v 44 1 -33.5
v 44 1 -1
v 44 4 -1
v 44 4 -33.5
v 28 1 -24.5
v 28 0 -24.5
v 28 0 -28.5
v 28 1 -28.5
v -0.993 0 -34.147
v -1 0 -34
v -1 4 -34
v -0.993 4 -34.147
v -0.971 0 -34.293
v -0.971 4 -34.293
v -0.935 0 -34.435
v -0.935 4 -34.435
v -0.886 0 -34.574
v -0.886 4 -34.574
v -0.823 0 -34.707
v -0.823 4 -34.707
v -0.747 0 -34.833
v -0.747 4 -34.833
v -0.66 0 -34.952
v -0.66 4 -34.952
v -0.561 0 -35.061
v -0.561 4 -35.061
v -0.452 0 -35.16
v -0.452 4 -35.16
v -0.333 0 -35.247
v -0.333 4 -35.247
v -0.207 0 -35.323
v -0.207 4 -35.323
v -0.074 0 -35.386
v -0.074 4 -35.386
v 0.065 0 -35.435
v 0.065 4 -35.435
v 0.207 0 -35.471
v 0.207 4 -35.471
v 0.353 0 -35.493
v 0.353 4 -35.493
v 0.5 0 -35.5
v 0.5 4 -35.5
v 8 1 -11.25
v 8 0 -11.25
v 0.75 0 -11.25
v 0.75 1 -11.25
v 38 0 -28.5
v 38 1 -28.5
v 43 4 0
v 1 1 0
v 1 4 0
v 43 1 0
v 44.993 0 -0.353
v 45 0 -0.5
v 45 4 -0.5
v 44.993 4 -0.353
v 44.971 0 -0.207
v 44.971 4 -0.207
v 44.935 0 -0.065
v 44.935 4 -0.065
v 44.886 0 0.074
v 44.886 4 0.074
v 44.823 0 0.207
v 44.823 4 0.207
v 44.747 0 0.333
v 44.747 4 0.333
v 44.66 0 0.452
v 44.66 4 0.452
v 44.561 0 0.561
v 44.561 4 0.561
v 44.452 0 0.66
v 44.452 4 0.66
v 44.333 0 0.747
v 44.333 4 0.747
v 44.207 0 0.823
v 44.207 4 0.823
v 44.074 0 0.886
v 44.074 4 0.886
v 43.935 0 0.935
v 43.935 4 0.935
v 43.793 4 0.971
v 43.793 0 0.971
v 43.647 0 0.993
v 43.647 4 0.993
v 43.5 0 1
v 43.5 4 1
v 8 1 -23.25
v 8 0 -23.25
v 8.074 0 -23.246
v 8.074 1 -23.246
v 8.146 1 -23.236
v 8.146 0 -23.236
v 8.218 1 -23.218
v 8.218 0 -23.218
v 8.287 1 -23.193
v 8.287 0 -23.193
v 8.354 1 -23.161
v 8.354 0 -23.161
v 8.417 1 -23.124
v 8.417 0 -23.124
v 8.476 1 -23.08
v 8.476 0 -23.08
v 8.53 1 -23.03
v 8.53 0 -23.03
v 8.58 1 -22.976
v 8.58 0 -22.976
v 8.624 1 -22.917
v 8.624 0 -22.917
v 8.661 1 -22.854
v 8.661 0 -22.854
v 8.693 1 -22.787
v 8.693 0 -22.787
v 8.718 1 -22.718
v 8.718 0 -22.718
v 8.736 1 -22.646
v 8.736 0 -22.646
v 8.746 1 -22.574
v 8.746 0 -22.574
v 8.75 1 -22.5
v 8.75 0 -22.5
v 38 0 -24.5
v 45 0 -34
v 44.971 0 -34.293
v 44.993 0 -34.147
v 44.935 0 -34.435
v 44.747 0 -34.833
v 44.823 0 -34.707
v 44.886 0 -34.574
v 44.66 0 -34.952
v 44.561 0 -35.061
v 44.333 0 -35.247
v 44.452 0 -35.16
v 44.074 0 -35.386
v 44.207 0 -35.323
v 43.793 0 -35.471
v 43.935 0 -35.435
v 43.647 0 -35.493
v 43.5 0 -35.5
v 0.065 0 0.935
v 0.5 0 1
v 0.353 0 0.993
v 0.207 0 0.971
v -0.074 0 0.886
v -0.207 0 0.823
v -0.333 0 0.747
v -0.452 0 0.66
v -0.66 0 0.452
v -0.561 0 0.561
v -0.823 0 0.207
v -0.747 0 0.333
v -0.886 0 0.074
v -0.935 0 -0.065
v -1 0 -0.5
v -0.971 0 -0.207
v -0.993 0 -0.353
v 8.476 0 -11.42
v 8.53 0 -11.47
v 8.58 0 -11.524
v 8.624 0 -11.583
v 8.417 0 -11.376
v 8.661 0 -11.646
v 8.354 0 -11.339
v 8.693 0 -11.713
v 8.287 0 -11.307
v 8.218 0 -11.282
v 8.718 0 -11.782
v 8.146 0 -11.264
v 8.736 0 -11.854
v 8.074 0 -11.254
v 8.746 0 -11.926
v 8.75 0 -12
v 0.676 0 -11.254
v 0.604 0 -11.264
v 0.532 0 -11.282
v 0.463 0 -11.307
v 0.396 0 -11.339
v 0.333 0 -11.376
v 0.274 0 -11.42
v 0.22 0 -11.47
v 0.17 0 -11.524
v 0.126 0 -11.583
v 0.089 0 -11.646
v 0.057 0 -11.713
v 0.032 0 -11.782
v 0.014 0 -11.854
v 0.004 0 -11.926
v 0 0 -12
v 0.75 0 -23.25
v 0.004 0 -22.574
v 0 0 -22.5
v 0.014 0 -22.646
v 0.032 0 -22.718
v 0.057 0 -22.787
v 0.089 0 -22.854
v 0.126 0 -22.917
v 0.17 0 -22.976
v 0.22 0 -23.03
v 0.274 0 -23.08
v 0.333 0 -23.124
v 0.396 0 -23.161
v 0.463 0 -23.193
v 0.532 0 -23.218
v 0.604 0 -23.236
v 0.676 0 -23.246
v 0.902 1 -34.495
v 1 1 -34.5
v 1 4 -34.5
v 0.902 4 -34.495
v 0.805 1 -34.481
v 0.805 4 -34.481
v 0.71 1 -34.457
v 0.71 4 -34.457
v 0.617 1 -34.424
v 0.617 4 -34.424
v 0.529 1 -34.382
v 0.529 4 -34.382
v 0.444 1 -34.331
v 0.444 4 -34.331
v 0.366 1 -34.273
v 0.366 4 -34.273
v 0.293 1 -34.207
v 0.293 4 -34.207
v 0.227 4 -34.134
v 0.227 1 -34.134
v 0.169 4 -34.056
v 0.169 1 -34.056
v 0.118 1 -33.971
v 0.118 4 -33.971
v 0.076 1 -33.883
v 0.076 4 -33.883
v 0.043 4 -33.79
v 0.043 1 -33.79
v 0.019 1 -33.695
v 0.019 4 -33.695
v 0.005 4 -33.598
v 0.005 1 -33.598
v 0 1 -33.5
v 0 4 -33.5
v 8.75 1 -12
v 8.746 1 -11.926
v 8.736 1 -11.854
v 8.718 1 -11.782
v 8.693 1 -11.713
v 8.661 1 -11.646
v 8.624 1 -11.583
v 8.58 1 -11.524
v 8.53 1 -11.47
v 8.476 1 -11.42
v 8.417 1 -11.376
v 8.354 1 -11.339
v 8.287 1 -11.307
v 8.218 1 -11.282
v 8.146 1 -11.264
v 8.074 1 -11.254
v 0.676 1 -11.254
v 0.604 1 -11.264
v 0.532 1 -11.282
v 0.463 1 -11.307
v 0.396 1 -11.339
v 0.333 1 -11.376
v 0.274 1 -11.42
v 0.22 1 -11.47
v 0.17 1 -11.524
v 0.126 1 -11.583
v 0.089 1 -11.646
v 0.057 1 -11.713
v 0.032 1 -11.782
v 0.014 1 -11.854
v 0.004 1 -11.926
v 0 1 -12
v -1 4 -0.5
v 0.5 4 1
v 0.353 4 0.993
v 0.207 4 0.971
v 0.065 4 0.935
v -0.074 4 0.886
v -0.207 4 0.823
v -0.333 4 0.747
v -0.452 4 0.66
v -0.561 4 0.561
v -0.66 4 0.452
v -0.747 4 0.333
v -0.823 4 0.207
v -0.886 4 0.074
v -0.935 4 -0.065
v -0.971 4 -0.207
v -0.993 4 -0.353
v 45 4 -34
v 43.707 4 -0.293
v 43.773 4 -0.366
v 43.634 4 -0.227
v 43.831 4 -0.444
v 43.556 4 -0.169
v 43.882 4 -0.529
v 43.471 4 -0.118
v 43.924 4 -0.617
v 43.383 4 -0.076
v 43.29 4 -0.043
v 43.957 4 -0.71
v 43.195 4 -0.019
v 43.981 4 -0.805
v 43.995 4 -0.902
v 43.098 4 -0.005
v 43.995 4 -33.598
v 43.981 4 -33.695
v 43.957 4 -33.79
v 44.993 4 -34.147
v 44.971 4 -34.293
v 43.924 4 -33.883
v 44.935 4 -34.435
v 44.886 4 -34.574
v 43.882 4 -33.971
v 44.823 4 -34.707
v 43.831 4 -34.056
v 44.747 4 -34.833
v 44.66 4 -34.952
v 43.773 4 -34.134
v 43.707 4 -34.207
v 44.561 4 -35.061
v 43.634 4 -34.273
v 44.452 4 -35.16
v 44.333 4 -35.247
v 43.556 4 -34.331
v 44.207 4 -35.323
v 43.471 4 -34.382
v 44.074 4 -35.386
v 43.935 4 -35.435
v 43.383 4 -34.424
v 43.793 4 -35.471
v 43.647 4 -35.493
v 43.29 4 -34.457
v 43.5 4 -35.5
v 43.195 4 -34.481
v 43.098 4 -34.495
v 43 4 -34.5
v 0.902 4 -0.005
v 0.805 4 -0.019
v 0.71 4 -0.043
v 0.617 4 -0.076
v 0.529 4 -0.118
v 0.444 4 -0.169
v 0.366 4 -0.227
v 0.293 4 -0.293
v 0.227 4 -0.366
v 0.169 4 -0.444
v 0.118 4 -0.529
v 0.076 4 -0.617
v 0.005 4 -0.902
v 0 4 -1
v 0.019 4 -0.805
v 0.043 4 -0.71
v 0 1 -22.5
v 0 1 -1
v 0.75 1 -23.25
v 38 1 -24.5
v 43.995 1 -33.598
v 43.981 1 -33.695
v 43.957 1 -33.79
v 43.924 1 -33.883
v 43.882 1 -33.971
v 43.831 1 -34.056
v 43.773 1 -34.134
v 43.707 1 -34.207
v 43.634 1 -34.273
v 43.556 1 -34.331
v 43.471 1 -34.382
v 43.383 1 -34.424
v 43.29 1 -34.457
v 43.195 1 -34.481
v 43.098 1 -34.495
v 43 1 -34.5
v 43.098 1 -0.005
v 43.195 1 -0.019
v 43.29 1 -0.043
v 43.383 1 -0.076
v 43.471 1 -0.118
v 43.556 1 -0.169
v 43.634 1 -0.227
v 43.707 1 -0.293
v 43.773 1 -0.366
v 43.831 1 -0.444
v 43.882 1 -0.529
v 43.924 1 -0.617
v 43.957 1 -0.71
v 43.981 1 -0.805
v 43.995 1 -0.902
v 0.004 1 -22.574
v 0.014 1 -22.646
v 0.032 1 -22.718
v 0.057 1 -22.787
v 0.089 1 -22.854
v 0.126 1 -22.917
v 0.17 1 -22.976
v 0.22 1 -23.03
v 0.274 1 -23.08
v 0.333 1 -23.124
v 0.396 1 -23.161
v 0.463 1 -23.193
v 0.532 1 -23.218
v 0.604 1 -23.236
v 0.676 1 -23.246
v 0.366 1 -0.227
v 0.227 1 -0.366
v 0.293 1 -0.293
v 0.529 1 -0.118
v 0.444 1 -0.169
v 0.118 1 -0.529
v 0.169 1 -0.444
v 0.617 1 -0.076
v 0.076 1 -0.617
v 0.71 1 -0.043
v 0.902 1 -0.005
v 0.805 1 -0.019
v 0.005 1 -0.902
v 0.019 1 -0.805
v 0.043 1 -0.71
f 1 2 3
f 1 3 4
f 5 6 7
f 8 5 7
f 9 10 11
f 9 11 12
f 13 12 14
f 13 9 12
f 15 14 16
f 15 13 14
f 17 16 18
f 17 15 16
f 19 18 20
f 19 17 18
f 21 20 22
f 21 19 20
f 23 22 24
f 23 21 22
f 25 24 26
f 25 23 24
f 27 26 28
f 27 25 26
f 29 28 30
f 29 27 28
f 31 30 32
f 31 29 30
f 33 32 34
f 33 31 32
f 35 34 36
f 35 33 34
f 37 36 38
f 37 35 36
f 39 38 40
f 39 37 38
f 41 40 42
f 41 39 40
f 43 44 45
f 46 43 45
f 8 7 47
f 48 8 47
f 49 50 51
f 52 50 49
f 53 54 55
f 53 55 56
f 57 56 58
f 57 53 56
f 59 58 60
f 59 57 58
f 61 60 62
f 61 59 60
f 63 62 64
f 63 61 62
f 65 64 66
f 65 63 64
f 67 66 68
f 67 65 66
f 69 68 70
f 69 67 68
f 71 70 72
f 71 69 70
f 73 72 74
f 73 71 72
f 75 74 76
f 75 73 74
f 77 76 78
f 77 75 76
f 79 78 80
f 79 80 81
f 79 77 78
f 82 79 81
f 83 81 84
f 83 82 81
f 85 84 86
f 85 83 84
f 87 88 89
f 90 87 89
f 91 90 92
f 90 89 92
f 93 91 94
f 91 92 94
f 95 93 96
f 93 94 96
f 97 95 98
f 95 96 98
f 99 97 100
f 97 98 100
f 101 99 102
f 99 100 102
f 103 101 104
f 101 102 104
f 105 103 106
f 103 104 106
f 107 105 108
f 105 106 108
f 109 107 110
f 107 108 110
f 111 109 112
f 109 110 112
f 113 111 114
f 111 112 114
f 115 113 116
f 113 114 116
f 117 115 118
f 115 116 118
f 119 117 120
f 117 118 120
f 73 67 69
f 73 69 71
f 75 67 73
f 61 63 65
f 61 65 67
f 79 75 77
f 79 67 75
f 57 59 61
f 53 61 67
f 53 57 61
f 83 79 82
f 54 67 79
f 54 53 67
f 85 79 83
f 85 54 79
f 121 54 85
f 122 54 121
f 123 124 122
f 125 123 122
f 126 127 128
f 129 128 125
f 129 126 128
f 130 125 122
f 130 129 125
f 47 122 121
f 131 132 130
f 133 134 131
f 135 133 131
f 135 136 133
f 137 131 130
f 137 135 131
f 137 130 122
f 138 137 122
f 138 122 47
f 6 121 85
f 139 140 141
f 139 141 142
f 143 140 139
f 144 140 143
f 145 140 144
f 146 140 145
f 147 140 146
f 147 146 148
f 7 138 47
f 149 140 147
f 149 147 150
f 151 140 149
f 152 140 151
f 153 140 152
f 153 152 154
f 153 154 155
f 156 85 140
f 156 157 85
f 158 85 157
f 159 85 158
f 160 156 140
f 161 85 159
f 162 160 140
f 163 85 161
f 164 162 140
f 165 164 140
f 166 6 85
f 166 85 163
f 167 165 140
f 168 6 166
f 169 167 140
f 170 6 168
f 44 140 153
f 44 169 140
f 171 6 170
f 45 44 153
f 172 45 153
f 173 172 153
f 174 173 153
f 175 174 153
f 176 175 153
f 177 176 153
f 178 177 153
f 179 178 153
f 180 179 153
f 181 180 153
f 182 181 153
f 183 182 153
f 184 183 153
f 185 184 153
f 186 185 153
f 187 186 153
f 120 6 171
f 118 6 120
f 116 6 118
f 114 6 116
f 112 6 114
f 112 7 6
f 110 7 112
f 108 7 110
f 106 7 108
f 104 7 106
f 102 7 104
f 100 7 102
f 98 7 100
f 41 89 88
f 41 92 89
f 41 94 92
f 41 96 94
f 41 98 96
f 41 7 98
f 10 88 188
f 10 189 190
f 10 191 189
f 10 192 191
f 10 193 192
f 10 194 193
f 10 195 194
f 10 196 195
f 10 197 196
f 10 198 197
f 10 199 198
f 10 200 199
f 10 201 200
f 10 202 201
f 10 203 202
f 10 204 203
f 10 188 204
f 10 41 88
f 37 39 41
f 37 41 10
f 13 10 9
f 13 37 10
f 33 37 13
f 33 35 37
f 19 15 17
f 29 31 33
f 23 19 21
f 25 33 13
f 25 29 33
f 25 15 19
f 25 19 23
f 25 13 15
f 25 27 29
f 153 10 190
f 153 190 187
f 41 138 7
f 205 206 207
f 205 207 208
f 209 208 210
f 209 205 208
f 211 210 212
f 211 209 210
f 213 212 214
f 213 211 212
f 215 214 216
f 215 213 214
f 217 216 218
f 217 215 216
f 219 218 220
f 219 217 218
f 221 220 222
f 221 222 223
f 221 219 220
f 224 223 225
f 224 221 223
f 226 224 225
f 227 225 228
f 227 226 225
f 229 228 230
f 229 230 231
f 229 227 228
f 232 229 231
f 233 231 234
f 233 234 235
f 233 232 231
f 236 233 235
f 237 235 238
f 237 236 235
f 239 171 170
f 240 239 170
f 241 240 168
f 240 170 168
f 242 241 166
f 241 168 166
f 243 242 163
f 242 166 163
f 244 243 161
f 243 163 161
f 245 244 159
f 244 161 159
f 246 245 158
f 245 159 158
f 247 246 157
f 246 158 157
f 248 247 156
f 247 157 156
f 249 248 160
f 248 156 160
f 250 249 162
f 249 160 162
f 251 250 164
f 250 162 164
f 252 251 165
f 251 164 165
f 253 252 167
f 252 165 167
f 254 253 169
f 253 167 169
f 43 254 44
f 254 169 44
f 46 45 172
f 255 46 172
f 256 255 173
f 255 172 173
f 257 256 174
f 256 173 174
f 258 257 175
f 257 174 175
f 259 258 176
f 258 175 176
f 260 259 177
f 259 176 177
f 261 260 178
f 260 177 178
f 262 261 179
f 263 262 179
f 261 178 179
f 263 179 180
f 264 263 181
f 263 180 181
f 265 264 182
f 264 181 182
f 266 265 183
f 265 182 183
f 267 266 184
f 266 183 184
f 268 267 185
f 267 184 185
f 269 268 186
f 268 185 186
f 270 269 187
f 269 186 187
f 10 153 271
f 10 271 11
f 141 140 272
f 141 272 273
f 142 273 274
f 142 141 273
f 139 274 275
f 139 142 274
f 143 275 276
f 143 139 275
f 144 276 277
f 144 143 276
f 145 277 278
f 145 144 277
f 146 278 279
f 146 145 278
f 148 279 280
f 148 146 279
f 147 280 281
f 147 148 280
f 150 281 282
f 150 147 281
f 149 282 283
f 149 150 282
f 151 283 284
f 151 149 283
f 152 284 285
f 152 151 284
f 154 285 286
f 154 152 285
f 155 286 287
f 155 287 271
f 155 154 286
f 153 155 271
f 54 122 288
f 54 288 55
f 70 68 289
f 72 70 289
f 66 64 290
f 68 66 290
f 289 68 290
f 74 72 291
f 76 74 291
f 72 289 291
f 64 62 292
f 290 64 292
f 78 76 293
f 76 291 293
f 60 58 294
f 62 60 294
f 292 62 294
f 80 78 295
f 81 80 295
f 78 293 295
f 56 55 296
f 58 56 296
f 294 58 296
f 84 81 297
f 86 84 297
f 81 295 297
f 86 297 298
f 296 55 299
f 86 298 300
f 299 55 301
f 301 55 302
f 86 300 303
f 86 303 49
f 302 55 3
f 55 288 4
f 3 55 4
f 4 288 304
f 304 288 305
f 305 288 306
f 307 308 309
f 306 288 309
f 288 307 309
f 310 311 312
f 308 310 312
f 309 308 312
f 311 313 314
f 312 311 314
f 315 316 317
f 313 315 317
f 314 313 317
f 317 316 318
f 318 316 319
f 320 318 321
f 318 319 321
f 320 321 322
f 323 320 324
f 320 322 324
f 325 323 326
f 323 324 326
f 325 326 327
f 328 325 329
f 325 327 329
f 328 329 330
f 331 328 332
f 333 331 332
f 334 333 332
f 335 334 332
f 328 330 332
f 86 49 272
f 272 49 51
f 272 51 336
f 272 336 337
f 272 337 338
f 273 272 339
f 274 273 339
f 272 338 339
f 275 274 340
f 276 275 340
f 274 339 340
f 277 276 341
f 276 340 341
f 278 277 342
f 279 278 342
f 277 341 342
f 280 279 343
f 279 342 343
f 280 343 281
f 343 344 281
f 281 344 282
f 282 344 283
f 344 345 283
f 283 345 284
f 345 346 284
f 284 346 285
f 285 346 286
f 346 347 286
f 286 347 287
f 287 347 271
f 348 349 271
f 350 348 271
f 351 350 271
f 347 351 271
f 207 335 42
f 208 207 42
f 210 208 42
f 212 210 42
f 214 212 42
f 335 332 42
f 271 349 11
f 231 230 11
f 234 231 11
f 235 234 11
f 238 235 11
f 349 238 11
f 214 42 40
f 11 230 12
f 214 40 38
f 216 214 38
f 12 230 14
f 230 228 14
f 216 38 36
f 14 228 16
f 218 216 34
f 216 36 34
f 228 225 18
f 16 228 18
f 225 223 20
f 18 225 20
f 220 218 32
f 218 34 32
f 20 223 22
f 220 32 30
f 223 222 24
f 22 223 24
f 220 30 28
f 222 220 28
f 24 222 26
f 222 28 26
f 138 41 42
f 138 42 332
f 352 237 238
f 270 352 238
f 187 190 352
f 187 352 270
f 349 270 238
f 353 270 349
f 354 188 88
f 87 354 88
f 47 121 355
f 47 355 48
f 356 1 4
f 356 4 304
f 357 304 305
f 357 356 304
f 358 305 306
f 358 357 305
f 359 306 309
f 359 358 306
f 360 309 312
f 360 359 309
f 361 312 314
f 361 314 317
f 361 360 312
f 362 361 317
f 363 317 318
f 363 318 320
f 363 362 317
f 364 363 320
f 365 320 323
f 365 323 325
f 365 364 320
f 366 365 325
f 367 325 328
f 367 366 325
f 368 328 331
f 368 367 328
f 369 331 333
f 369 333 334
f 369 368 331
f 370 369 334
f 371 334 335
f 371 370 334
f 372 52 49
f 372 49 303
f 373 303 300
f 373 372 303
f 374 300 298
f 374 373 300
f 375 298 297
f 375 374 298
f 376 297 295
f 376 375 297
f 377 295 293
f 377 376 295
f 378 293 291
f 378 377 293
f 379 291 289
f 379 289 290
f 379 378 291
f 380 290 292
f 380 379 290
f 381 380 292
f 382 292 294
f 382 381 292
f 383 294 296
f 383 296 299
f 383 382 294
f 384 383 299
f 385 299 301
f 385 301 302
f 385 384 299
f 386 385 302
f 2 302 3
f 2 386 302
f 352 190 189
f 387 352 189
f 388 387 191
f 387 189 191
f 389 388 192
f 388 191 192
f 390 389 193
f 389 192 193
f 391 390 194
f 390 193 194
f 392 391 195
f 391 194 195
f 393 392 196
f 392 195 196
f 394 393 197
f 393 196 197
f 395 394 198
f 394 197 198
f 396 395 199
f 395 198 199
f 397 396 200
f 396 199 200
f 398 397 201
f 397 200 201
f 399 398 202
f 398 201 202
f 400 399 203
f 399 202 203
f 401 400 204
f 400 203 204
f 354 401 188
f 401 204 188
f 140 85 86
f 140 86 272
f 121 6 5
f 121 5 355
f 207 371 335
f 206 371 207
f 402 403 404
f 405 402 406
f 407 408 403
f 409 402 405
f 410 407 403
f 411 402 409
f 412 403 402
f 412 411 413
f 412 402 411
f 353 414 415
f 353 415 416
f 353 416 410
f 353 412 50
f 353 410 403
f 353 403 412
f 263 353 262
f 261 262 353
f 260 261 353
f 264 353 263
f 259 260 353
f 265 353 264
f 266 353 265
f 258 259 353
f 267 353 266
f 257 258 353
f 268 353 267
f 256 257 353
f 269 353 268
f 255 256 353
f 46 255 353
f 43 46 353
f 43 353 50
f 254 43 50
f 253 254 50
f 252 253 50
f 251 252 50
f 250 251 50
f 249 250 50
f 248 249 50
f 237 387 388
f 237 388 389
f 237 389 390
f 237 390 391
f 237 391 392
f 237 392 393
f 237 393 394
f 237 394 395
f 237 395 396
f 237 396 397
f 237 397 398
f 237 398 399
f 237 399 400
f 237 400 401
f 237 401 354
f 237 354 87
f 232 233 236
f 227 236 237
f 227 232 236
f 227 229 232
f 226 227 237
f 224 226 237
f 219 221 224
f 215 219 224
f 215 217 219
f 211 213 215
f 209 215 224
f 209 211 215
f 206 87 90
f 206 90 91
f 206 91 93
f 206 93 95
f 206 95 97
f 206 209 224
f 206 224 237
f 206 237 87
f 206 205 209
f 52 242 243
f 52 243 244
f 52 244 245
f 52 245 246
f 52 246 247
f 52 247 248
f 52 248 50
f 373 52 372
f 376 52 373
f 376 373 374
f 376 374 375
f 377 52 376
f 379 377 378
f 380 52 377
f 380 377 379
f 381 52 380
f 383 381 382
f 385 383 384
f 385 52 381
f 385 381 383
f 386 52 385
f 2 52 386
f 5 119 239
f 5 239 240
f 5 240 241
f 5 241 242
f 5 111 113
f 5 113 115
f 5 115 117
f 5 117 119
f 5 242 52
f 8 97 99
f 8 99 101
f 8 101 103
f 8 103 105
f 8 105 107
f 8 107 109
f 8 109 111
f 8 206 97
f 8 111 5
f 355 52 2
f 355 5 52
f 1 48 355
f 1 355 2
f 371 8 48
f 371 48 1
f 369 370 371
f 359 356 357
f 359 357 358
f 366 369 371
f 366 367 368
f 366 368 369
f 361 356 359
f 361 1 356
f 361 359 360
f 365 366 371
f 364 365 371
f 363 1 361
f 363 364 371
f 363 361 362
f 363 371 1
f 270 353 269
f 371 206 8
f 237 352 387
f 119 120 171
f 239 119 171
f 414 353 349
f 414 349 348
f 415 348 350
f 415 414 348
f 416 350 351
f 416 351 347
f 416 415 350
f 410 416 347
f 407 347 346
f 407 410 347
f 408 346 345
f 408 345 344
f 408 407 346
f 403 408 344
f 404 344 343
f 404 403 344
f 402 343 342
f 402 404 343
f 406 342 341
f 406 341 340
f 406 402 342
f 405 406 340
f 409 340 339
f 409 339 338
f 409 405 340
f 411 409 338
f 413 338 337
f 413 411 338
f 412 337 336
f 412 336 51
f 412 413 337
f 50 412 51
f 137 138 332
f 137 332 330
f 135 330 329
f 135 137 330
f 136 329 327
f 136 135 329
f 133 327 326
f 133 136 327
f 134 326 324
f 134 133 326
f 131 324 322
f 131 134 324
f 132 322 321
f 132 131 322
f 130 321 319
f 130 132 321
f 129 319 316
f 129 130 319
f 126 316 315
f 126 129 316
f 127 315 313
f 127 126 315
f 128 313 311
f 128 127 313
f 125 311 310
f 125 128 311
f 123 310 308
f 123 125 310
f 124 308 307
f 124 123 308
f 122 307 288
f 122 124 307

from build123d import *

# Parameters (mm, degrees)
SKETCH1_W           = 10
SKETCH1_H           = 4
BOSS_EXTRUDE1_DEPTH = 1
BOSS_EXTRUDE2_DEPTH = 4


with BuildPart() as part:
    # Sketch1 → Boss-Extrude1 (new body)
    with BuildSketch(Plane(origin=(0, 0, 0), x_dir=(1, 0, 0), z_dir=(0, 1, 0))):
        with BuildLine():
            Line((8.75, 22.5), (8.75, 12))
            ThreePointArc((8.75, 12), (8.530330086, 11.469669914), (8, 11.25))
            Line((8, 11.25), (0.75, 11.25))
            ThreePointArc((0.75, 11.25), (0.219669914, 11.469669914), (0, 12))
            Line((0, 12), (0, 1))
            ThreePointArc((0, 1), (0.292893219, 0.292893219), (1, 0))
            Line((1, 0), (43, 0))
            ThreePointArc((43, 0), (43.707106781, 0.292893219), (44, 1))
            Line((44, 1), (44, 33.5))
            ThreePointArc((44, 33.5), (43.707106781, 34.207106781), (43, 34.5))
            Line((43, 34.5), (1, 34.5))
            ThreePointArc((1, 34.5), (0.292893219, 34.207106781), (0, 33.5))
            Line((0, 33.5), (0, 22.5))
            ThreePointArc((0, 22.5), (0.219669914, 23.030330086), (0.75, 23.25))
            Line((0.75, 23.25), (8, 23.25))
            ThreePointArc((8, 23.25), (8.530330086, 23.030330086), (8.75, 22.5))
        make_face()
        with Locations((33, 26.5)):
            Rectangle(SKETCH1_W, SKETCH1_H, mode=Mode.SUBTRACT)
    extrude(amount=BOSS_EXTRUDE1_DEPTH)

    # Sketch1<3> → Boss-Extrude2 (add)
    with BuildSketch(Plane(origin=(0, 0, 0), x_dir=(1, 0, 0), z_dir=(0, 1, 0))):
        with BuildLine():
            ThreePointArc((-1, 0.5), (-0.560660172, -0.560660172), (0.5, -1))
            Line((0.5, -1), (43.5, -1))
            ThreePointArc((43.5, -1), (44.560660172, -0.560660172), (45, 0.5))
            Line((45, 0.5), (45, 34))
            ThreePointArc((45, 34), (44.560660172, 35.060660172), (43.5, 35.5))
            Line((43.5, 35.5), (0.5, 35.5))
            ThreePointArc((0.5, 35.5), (-0.560660172, 35.060660172), (-1, 34))
            Line((-1, 34), (-1, 0.5))
        make_face()
        with BuildLine():
            Line((43, 0), (1, 0))
            ThreePointArc((1, 0), (0.292893219, 0.292893219), (0, 1))
            Line((0, 1), (0, 9.75))
            Line((0, 9.75), (0, 12))
            Line((0, 12), (0, 22.5))
            Line((0, 22.5), (0, 24.75))
            Line((0, 24.75), (0, 33.5))
            ThreePointArc((0, 33.5), (0.292893219, 34.207106781), (1, 34.5))
            Line((1, 34.5), (43, 34.5))
            ThreePointArc((43, 34.5), (43.707106781, 34.207106781), (44, 33.5))
            Line((44, 33.5), (44, 1))
            ThreePointArc((44, 1), (43.707106781, 0.292893219), (43, 0))
        make_face(mode=Mode.SUBTRACT)
    extrude(amount=BOSS_EXTRUDE2_DEPTH)


solid = part.part
